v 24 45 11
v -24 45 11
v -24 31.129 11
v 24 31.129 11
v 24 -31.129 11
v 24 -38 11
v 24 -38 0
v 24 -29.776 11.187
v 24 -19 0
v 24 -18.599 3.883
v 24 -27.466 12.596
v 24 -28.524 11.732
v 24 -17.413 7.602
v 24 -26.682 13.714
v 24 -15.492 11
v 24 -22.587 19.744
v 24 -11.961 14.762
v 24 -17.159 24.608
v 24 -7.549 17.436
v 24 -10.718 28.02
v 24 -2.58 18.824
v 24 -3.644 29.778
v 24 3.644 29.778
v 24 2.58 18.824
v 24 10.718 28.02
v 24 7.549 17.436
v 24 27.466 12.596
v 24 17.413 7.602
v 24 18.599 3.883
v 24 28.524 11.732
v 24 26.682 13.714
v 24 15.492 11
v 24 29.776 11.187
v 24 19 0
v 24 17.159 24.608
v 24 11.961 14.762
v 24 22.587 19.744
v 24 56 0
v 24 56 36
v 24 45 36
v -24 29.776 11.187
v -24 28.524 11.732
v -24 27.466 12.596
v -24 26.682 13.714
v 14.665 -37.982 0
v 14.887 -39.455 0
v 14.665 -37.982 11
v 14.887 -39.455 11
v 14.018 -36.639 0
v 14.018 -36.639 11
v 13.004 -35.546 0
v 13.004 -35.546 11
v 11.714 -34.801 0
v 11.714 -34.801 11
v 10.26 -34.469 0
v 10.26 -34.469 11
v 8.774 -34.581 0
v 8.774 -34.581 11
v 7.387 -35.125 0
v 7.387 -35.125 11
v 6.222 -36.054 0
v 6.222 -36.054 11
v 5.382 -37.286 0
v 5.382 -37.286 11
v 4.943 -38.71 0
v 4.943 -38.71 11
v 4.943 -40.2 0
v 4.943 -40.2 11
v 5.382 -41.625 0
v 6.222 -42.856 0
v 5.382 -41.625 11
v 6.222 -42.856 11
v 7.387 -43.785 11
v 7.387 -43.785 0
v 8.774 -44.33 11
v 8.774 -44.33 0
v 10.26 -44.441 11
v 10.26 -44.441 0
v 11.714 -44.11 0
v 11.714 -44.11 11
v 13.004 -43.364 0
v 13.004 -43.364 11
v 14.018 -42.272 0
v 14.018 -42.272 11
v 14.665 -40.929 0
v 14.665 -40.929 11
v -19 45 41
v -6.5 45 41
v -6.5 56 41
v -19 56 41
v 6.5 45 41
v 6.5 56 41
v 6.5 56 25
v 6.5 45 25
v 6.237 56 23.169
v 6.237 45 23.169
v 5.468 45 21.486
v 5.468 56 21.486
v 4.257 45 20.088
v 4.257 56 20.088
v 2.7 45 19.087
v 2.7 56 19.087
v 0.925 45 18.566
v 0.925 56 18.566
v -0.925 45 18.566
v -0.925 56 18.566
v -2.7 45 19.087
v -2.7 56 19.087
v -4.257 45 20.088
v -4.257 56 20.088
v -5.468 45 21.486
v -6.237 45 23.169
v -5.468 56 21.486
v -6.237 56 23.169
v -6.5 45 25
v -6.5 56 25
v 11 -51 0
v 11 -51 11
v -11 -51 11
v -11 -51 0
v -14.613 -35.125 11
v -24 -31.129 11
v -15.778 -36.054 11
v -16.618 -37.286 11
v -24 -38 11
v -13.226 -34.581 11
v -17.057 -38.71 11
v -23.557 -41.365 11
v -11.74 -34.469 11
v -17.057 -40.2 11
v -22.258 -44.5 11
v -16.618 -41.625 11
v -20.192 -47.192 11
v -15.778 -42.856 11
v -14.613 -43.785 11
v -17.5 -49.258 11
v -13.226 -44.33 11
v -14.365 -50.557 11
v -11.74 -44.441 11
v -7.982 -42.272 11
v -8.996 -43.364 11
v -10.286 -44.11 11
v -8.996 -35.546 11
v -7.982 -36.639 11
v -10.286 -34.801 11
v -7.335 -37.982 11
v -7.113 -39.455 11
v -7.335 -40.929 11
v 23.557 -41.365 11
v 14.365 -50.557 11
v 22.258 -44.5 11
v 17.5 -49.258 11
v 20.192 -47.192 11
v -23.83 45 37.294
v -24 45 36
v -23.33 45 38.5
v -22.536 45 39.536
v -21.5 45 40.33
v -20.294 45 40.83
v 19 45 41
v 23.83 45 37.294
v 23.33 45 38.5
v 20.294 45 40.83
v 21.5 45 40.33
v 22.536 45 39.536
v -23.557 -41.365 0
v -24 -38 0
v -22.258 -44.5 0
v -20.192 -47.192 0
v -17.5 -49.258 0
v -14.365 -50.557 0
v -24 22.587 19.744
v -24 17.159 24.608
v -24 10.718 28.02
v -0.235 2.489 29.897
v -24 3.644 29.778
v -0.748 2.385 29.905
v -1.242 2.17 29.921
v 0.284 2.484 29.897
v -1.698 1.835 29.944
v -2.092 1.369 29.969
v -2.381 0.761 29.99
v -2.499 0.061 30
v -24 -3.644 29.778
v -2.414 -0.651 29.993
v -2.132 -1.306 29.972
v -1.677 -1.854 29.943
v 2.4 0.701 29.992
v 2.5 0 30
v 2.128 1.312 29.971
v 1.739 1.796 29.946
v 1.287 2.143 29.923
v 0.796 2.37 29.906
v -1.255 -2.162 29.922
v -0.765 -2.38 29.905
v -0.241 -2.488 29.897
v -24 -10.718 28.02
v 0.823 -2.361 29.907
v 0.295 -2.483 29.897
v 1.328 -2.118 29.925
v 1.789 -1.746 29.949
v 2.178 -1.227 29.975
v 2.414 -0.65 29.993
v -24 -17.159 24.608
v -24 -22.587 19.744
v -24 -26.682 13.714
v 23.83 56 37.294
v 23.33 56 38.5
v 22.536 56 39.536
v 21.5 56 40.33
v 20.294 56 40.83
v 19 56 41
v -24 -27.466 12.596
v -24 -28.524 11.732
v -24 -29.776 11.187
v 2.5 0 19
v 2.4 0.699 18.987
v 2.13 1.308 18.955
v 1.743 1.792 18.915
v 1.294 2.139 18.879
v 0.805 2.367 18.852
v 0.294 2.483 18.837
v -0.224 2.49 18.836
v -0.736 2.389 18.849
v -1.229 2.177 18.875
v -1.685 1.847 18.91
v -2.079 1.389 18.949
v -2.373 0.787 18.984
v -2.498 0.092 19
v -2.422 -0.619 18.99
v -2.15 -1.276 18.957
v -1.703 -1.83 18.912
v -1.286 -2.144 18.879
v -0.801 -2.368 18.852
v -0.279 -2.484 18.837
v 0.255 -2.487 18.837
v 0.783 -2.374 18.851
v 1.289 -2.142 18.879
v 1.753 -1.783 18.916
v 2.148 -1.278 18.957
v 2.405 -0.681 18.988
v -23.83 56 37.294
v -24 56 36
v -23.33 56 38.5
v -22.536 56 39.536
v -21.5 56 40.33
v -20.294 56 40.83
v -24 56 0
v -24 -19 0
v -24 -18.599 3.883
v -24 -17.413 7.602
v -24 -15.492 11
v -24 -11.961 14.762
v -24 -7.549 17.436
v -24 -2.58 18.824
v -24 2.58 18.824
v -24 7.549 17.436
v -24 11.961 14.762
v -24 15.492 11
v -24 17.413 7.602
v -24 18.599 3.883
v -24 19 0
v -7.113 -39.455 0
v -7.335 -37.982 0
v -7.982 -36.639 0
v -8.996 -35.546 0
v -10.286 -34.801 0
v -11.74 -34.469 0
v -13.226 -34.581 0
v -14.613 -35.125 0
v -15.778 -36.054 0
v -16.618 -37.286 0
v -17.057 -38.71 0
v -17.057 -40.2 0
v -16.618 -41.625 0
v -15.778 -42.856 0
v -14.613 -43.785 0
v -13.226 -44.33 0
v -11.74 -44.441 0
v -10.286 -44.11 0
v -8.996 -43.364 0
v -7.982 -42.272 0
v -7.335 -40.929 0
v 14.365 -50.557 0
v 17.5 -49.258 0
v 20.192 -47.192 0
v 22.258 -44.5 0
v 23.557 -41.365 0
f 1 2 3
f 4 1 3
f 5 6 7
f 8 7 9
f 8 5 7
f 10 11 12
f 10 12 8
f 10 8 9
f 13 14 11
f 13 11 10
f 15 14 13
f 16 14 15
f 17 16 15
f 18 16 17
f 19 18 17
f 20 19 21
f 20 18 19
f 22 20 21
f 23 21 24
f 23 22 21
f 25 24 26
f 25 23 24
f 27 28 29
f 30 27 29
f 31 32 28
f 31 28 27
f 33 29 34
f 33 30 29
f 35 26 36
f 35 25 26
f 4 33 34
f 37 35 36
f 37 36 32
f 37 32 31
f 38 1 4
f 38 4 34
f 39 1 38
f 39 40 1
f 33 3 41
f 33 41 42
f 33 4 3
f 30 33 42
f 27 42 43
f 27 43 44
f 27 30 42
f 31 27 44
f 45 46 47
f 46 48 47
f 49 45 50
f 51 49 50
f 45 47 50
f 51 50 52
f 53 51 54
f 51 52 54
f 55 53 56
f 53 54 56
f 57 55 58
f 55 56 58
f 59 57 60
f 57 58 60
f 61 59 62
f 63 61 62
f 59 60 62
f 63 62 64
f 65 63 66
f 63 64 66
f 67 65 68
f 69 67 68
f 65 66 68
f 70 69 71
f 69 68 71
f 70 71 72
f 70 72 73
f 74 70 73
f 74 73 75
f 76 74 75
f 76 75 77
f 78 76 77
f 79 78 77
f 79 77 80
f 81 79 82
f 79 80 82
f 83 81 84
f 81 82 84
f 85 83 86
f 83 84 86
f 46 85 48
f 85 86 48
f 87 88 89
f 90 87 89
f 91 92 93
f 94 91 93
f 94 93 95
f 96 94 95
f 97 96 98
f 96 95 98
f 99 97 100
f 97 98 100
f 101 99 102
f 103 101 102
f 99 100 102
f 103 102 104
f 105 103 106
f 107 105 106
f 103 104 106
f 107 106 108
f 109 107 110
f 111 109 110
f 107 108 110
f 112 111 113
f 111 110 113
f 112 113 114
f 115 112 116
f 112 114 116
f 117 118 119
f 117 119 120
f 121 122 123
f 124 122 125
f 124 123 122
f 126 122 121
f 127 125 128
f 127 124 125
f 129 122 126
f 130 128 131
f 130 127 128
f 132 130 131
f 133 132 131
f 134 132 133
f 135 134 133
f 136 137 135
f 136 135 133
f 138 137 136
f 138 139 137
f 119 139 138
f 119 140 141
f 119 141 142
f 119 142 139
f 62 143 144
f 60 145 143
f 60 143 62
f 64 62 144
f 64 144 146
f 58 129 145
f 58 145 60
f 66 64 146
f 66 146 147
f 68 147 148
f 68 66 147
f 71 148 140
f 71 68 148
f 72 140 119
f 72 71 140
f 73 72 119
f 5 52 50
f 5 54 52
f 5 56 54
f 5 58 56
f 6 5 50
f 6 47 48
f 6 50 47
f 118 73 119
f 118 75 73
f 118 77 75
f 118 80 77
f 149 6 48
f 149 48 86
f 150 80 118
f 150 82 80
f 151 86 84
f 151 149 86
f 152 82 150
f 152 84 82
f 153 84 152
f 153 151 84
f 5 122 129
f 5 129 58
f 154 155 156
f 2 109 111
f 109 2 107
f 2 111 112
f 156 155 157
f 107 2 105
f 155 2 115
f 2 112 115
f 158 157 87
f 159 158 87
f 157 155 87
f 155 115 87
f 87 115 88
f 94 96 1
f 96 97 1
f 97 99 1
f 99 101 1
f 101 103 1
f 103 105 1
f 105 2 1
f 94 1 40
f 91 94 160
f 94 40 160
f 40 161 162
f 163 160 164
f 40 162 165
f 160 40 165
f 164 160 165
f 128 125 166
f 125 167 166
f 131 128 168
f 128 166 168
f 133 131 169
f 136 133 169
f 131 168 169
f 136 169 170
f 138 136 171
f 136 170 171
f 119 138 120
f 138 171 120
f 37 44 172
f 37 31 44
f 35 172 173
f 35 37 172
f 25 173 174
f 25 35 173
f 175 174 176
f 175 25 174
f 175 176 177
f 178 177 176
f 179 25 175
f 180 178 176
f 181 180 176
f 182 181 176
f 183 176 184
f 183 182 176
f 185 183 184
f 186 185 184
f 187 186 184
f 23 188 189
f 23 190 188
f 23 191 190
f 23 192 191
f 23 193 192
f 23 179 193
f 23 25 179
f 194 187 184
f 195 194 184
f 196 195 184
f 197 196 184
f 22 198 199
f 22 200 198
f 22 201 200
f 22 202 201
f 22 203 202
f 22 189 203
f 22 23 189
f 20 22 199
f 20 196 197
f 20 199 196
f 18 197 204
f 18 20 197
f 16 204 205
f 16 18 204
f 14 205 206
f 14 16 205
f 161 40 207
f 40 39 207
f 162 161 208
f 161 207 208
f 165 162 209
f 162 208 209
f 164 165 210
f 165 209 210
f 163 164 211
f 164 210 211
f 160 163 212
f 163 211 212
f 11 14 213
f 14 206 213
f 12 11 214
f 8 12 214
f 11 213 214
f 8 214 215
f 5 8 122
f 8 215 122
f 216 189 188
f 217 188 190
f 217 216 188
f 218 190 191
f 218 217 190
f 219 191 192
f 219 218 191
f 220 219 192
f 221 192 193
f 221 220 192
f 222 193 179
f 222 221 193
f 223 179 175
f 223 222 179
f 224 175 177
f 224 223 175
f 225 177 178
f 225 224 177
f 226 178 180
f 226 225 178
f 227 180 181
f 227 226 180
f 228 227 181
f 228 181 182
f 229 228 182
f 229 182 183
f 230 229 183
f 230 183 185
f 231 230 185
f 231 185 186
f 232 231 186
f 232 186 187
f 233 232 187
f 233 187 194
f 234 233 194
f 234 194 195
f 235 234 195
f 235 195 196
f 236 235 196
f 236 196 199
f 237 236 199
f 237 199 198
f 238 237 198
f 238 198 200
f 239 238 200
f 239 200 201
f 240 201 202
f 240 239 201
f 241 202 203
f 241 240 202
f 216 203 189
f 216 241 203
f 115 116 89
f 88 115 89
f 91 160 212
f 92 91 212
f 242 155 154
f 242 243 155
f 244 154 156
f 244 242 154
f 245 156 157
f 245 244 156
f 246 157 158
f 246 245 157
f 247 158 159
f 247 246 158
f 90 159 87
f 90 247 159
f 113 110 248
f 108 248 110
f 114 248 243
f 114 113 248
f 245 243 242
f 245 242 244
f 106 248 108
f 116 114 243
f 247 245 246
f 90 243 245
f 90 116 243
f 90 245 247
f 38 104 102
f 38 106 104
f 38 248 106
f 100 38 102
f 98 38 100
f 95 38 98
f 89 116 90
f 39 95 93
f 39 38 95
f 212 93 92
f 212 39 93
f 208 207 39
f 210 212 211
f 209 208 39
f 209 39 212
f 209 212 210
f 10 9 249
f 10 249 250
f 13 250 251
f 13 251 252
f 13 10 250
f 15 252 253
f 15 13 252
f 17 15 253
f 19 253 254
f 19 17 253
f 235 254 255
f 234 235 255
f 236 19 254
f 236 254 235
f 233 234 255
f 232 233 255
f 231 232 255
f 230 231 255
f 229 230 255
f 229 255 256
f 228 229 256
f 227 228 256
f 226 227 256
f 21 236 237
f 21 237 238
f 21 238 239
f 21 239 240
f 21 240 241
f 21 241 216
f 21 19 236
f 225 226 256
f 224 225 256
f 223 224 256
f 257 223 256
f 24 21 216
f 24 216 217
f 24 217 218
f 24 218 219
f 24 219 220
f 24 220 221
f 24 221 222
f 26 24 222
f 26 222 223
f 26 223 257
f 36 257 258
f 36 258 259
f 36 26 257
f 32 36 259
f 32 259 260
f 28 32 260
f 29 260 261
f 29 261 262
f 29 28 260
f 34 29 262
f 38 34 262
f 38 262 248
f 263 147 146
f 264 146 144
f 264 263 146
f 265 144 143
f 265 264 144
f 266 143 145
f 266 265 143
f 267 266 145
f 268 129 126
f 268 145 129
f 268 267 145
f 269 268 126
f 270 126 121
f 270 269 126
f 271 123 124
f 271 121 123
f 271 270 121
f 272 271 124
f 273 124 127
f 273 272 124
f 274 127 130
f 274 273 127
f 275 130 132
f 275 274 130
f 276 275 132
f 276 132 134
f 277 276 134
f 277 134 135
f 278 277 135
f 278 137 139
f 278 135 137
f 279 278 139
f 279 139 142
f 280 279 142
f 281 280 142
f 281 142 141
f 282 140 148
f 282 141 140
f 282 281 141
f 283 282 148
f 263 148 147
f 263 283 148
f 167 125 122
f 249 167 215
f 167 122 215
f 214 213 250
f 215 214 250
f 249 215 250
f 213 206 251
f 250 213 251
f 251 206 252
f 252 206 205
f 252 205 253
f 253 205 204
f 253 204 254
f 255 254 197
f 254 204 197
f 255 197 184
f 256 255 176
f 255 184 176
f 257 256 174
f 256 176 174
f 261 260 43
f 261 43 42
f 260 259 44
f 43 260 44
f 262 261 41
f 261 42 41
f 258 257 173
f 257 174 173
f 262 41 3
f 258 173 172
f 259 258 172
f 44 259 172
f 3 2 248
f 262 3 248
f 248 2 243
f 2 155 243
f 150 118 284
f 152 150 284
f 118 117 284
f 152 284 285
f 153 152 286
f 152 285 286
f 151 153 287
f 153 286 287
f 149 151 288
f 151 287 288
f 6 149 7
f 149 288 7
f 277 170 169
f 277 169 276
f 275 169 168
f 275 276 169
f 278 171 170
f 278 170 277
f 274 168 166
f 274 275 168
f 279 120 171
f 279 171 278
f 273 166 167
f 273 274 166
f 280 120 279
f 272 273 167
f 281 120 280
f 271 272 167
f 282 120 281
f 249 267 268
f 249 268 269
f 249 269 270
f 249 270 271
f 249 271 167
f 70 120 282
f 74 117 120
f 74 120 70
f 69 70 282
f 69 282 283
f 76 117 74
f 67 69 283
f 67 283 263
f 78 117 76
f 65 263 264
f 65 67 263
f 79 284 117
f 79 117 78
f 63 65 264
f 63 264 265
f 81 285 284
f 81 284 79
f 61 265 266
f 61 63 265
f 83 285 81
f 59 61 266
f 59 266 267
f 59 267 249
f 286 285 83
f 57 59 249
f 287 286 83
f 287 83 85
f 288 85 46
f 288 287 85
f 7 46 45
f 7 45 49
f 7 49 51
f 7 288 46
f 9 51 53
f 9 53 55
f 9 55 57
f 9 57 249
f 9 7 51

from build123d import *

# Parameters (mm, degrees)
F0_W     = 11
F0_H     = 11
F0_H_2   = 30
F1_DEPTH = 24
F3_DEPTH = 12.5
F4_R     = 2.5
F4_R_2   = 5
F5_DEPTH = 56
F6_R     = 13
F7_R     = 5
F8_R     = 5


with BuildPart() as f1:
    # F0 (on Right) → F1 (new body, symmetric)
    with BuildSketch(Plane.YZ):
        with BuildLine():
            Line((-51, 0), (-30, 0))
            ThreePointArc((-30, 0), (-29.4730143031, 5.5983415304), (-27.9105714739, 11))
            Line((-27.9105714739, 11), (-51, 11))
            Line((-51, 11), (-51, 0))
        make_face()
        with BuildLine():
            ThreePointArc((-27.9105714739, 11), (-29.4730143031, 5.5983415304), (-30, 0))
            Line((-30, 0), (-19, 0))
            ThreePointArc((-19, 0), (-18.1017503893, 5.7729223833), (-15.4919333848, 11))
            Line((-15.4919333848, 11), (-27.9105714739, 11))
        make_face()
        with BuildLine():
            Line((15.4919333848, 11), (27.9105714739, 11))
            ThreePointArc((27.9105714739, 11), (0, 30), (-27.9105714739, 11))
            Line((-27.9105714739, 11), (-15.4919333848, 11))
            ThreePointArc((-15.4919333848, 11), (0, 19), (15.4919333848, 11))
        make_face()
        with BuildLine():
            Line((19, 0), (30, 0))
            ThreePointArc((30, 0), (29.4730143031, 5.5983415304), (27.9105714739, 11))
            Line((27.9105714739, 11), (15.4919333848, 11))
            ThreePointArc((15.4919333848, 11), (18.1017503893, 5.7729223833), (19, 0))
        make_face()
        with BuildLine():
            ThreePointArc((27.9105714739, 11), (29.4730143031, 5.5983415304), (30, 0))
            Line((30, 0), (45, 0))
            Line((45, 0), (45, 11))
            Line((45, 11), (27.9105714739, 11))
        make_face()
        with Locations((50.5, 5.5)):
            Rectangle(F0_W, F0_H)
        with Locations((50.5, 26)):
            Rectangle(F0_W, F0_H_2)
    extrude(amount=F1_DEPTH, both=True)

    # F2 (on face) → F3 (cut, symmetric)
    with BuildSketch(Plane(origin=(0, 56, 0), x_dir=(-1, 0, 0), z_dir=(0, 1, 0))):
        with BuildLine():
            ThreePointArc((-6.5, 25), (0, 18.5), (6.5, 25))
            ThreePointArc((6.5, 25), (0, 31.5), (-6.5, 25))
        make_face()
        with BuildLine():
            ThreePointArc((-6.5, 25), (0, 31.5), (6.5, 25))
            Line((6.5, 25), (6.5, 41))
            Line((6.5, 41), (-6.5, 41))
            Line((-6.5, 41), (-6.5, 25))
        make_face()
    extrude(amount=F3_DEPTH, both=True, mode=Mode.SUBTRACT)

    # F4 (on Top) → F5 (cut, symmetric)
    with BuildSketch(Plane.XY):
        Circle(F4_R)
        with Locations((-12.1131800115, -39.455285737)):
            Circle(F4_R_2)
        with Locations((9.8868199885, -39.455285737)):
            Circle(F4_R_2)
    extrude(amount=F5_DEPTH, both=True, mode=Mode.SUBTRACT)

    # F6
    f6_edges = [f1.edges().sort_by_distance(p)[0] for p in [
        (-24, -51, 5.5),
        (24, -51, 5.5),
    ]]
    fillet(f6_edges, radius=F6_R)

    # F7
    f7_edges = [f1.edges().sort_by_distance(p)[0] for p in [
        (-24, 50.5, 41),
        (24, 50.5, 41),
    ]]
    fillet(f7_edges, radius=F7_R)

    # F8
    f8_edges = [f1.edges().sort_by_distance(p)[0] for p in [
        (0, 27.910571, 11),
        (0, -27.910571, 11),
    ]]
    fillet(f8_edges, radius=F8_R)


solid = f1.part
